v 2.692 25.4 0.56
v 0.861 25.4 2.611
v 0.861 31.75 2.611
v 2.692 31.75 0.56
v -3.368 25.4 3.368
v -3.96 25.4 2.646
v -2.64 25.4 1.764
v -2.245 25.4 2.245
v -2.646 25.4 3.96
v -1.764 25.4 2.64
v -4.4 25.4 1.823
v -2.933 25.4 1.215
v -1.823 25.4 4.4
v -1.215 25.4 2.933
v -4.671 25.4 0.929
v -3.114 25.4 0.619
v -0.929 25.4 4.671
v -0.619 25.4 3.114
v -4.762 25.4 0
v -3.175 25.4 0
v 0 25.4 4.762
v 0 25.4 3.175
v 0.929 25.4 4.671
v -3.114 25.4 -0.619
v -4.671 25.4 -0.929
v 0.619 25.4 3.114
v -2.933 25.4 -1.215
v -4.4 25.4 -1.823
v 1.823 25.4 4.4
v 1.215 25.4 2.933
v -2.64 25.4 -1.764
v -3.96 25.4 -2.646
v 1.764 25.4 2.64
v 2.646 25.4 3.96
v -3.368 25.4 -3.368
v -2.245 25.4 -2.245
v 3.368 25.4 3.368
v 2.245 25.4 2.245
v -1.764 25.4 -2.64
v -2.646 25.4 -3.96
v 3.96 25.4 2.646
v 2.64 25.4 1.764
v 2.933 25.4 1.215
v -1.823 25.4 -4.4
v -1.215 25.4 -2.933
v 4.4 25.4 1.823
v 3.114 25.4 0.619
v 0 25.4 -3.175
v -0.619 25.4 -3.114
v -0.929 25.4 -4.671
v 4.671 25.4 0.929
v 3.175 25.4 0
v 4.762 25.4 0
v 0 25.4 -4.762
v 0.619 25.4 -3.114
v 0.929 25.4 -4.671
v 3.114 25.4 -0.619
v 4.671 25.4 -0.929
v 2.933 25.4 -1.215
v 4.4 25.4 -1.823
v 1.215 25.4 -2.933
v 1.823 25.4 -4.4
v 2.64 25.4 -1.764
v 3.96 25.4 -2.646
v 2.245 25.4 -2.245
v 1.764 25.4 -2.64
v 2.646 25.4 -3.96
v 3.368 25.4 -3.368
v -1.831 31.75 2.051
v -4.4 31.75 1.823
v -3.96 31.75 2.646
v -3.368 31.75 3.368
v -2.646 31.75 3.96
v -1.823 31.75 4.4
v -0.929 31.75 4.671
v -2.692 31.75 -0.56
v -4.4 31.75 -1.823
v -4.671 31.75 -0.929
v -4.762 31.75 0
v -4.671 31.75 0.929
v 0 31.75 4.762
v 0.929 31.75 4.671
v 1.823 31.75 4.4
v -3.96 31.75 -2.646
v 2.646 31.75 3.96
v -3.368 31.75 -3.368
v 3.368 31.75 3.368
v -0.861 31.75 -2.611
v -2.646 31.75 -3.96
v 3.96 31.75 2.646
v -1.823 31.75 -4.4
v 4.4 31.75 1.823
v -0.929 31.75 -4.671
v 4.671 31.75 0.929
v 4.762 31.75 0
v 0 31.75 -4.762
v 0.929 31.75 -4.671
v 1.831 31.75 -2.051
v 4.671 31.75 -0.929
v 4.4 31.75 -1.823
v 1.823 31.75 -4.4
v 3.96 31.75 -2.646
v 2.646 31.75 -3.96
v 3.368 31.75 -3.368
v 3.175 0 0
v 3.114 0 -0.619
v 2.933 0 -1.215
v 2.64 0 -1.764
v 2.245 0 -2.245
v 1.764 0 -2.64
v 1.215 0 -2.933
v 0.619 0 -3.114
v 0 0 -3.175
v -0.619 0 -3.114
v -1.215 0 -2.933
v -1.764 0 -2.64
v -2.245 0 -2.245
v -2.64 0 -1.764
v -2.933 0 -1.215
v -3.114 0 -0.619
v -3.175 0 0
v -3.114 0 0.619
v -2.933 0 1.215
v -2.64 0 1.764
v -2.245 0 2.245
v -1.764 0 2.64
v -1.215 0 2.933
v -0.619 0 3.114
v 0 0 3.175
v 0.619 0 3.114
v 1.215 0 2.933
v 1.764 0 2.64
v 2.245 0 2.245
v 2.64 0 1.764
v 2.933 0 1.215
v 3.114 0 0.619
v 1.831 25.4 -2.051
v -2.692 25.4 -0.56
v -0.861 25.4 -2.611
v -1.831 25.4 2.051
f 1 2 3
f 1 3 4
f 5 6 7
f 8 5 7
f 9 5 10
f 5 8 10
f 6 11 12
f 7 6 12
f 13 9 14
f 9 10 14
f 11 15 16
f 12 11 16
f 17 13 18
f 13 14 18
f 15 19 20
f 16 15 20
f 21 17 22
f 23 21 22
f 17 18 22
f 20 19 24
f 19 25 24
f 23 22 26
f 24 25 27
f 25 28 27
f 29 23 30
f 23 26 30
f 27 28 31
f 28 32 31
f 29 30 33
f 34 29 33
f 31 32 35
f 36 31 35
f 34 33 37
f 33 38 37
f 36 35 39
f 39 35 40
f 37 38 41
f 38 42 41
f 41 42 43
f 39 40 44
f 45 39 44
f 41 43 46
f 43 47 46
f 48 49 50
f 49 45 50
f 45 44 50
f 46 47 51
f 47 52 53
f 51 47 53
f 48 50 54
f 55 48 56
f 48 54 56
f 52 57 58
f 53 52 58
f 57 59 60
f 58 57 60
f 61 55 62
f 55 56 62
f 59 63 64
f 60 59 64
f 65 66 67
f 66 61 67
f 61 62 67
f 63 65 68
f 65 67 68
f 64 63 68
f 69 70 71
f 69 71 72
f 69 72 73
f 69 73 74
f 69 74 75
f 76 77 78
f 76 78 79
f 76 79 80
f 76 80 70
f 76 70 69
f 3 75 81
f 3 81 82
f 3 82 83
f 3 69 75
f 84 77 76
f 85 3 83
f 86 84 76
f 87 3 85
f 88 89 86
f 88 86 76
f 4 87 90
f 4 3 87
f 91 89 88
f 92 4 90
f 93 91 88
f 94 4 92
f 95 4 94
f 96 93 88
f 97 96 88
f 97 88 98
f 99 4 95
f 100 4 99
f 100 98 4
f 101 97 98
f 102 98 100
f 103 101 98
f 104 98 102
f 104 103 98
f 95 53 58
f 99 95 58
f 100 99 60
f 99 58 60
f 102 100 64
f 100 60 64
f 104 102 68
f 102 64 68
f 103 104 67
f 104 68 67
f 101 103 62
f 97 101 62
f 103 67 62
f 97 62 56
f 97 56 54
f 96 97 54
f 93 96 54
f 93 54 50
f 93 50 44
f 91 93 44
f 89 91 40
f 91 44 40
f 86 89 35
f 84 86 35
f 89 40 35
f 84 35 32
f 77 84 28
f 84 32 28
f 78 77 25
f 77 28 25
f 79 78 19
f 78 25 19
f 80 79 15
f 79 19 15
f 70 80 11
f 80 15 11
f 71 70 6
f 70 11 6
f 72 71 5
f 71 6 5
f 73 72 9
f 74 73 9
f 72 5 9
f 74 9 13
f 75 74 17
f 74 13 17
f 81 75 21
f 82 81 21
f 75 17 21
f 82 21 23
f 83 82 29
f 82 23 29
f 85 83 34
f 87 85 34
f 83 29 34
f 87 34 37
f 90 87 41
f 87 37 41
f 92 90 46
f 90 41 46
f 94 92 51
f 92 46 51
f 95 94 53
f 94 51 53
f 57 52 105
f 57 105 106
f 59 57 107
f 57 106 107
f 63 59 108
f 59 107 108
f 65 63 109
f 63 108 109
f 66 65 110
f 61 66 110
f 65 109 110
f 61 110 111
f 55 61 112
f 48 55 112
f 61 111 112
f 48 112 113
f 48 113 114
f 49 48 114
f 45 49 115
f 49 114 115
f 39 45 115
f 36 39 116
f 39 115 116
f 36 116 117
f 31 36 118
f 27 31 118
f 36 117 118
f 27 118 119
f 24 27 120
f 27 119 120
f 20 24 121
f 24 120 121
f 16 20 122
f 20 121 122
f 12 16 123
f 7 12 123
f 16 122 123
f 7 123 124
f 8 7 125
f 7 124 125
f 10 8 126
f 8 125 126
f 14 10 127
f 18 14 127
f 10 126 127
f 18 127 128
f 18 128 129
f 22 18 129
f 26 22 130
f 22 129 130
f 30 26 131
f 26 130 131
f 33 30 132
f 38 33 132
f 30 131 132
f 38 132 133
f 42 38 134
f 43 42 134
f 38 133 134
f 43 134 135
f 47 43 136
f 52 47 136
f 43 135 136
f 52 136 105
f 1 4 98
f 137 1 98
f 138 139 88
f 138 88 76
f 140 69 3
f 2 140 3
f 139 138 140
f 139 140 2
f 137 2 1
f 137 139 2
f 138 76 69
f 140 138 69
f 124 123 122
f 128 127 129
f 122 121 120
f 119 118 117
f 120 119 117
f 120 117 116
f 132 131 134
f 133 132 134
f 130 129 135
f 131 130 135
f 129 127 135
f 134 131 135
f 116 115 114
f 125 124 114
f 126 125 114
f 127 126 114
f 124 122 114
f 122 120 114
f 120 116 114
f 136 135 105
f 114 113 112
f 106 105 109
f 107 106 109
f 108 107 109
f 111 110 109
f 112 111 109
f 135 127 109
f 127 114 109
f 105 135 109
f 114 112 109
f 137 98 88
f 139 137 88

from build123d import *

# Parameters (mm, degrees)
SKETCH1_R           = 3.175
BOSS_EXTRUDE1_DEPTH = 25.4
SKETCH2_R           = 4.7625
BOSS_EXTRUDE2_DEPTH = 6.35
CUT_EXTRUDE1_DEPTH  = 6.35


with BuildPart() as part:
    # Sketch1 → Boss-Extrude1 (new body)
    with BuildSketch(Plane(origin=(0, 0, 0), x_dir=(1, 0, 0), z_dir=(0, 1, 0))):
        Circle(SKETCH1_R)
    extrude(amount=BOSS_EXTRUDE1_DEPTH)

    # Sketch2 → Boss-Extrude2 (add)
    with BuildSketch(Plane(origin=(0, 25.4, 0), x_dir=(1, 0, 0), z_dir=(0, 1, 0))):
        Circle(SKETCH2_R)
    extrude(amount=BOSS_EXTRUDE2_DEPTH)

    # Sketch3 → Cut-Extrude1 (cut)
    with BuildSketch(Plane(origin=(0, 31.75, 0), x_dir=(1, 0, 0), z_dir=(0, 1, 0))):
        Polygon((-2.692012499, 0.559944154), (-1.830932112, -2.051379134), (0.861080387, -2.611323288), (2.692012499, -0.559944154), (1.830932112, 2.051379134), (-0.861080387, 2.611323288), align=None)
    extrude(amount=-CUT_EXTRUDE1_DEPTH, mode=Mode.SUBTRACT)


solid = part.part
